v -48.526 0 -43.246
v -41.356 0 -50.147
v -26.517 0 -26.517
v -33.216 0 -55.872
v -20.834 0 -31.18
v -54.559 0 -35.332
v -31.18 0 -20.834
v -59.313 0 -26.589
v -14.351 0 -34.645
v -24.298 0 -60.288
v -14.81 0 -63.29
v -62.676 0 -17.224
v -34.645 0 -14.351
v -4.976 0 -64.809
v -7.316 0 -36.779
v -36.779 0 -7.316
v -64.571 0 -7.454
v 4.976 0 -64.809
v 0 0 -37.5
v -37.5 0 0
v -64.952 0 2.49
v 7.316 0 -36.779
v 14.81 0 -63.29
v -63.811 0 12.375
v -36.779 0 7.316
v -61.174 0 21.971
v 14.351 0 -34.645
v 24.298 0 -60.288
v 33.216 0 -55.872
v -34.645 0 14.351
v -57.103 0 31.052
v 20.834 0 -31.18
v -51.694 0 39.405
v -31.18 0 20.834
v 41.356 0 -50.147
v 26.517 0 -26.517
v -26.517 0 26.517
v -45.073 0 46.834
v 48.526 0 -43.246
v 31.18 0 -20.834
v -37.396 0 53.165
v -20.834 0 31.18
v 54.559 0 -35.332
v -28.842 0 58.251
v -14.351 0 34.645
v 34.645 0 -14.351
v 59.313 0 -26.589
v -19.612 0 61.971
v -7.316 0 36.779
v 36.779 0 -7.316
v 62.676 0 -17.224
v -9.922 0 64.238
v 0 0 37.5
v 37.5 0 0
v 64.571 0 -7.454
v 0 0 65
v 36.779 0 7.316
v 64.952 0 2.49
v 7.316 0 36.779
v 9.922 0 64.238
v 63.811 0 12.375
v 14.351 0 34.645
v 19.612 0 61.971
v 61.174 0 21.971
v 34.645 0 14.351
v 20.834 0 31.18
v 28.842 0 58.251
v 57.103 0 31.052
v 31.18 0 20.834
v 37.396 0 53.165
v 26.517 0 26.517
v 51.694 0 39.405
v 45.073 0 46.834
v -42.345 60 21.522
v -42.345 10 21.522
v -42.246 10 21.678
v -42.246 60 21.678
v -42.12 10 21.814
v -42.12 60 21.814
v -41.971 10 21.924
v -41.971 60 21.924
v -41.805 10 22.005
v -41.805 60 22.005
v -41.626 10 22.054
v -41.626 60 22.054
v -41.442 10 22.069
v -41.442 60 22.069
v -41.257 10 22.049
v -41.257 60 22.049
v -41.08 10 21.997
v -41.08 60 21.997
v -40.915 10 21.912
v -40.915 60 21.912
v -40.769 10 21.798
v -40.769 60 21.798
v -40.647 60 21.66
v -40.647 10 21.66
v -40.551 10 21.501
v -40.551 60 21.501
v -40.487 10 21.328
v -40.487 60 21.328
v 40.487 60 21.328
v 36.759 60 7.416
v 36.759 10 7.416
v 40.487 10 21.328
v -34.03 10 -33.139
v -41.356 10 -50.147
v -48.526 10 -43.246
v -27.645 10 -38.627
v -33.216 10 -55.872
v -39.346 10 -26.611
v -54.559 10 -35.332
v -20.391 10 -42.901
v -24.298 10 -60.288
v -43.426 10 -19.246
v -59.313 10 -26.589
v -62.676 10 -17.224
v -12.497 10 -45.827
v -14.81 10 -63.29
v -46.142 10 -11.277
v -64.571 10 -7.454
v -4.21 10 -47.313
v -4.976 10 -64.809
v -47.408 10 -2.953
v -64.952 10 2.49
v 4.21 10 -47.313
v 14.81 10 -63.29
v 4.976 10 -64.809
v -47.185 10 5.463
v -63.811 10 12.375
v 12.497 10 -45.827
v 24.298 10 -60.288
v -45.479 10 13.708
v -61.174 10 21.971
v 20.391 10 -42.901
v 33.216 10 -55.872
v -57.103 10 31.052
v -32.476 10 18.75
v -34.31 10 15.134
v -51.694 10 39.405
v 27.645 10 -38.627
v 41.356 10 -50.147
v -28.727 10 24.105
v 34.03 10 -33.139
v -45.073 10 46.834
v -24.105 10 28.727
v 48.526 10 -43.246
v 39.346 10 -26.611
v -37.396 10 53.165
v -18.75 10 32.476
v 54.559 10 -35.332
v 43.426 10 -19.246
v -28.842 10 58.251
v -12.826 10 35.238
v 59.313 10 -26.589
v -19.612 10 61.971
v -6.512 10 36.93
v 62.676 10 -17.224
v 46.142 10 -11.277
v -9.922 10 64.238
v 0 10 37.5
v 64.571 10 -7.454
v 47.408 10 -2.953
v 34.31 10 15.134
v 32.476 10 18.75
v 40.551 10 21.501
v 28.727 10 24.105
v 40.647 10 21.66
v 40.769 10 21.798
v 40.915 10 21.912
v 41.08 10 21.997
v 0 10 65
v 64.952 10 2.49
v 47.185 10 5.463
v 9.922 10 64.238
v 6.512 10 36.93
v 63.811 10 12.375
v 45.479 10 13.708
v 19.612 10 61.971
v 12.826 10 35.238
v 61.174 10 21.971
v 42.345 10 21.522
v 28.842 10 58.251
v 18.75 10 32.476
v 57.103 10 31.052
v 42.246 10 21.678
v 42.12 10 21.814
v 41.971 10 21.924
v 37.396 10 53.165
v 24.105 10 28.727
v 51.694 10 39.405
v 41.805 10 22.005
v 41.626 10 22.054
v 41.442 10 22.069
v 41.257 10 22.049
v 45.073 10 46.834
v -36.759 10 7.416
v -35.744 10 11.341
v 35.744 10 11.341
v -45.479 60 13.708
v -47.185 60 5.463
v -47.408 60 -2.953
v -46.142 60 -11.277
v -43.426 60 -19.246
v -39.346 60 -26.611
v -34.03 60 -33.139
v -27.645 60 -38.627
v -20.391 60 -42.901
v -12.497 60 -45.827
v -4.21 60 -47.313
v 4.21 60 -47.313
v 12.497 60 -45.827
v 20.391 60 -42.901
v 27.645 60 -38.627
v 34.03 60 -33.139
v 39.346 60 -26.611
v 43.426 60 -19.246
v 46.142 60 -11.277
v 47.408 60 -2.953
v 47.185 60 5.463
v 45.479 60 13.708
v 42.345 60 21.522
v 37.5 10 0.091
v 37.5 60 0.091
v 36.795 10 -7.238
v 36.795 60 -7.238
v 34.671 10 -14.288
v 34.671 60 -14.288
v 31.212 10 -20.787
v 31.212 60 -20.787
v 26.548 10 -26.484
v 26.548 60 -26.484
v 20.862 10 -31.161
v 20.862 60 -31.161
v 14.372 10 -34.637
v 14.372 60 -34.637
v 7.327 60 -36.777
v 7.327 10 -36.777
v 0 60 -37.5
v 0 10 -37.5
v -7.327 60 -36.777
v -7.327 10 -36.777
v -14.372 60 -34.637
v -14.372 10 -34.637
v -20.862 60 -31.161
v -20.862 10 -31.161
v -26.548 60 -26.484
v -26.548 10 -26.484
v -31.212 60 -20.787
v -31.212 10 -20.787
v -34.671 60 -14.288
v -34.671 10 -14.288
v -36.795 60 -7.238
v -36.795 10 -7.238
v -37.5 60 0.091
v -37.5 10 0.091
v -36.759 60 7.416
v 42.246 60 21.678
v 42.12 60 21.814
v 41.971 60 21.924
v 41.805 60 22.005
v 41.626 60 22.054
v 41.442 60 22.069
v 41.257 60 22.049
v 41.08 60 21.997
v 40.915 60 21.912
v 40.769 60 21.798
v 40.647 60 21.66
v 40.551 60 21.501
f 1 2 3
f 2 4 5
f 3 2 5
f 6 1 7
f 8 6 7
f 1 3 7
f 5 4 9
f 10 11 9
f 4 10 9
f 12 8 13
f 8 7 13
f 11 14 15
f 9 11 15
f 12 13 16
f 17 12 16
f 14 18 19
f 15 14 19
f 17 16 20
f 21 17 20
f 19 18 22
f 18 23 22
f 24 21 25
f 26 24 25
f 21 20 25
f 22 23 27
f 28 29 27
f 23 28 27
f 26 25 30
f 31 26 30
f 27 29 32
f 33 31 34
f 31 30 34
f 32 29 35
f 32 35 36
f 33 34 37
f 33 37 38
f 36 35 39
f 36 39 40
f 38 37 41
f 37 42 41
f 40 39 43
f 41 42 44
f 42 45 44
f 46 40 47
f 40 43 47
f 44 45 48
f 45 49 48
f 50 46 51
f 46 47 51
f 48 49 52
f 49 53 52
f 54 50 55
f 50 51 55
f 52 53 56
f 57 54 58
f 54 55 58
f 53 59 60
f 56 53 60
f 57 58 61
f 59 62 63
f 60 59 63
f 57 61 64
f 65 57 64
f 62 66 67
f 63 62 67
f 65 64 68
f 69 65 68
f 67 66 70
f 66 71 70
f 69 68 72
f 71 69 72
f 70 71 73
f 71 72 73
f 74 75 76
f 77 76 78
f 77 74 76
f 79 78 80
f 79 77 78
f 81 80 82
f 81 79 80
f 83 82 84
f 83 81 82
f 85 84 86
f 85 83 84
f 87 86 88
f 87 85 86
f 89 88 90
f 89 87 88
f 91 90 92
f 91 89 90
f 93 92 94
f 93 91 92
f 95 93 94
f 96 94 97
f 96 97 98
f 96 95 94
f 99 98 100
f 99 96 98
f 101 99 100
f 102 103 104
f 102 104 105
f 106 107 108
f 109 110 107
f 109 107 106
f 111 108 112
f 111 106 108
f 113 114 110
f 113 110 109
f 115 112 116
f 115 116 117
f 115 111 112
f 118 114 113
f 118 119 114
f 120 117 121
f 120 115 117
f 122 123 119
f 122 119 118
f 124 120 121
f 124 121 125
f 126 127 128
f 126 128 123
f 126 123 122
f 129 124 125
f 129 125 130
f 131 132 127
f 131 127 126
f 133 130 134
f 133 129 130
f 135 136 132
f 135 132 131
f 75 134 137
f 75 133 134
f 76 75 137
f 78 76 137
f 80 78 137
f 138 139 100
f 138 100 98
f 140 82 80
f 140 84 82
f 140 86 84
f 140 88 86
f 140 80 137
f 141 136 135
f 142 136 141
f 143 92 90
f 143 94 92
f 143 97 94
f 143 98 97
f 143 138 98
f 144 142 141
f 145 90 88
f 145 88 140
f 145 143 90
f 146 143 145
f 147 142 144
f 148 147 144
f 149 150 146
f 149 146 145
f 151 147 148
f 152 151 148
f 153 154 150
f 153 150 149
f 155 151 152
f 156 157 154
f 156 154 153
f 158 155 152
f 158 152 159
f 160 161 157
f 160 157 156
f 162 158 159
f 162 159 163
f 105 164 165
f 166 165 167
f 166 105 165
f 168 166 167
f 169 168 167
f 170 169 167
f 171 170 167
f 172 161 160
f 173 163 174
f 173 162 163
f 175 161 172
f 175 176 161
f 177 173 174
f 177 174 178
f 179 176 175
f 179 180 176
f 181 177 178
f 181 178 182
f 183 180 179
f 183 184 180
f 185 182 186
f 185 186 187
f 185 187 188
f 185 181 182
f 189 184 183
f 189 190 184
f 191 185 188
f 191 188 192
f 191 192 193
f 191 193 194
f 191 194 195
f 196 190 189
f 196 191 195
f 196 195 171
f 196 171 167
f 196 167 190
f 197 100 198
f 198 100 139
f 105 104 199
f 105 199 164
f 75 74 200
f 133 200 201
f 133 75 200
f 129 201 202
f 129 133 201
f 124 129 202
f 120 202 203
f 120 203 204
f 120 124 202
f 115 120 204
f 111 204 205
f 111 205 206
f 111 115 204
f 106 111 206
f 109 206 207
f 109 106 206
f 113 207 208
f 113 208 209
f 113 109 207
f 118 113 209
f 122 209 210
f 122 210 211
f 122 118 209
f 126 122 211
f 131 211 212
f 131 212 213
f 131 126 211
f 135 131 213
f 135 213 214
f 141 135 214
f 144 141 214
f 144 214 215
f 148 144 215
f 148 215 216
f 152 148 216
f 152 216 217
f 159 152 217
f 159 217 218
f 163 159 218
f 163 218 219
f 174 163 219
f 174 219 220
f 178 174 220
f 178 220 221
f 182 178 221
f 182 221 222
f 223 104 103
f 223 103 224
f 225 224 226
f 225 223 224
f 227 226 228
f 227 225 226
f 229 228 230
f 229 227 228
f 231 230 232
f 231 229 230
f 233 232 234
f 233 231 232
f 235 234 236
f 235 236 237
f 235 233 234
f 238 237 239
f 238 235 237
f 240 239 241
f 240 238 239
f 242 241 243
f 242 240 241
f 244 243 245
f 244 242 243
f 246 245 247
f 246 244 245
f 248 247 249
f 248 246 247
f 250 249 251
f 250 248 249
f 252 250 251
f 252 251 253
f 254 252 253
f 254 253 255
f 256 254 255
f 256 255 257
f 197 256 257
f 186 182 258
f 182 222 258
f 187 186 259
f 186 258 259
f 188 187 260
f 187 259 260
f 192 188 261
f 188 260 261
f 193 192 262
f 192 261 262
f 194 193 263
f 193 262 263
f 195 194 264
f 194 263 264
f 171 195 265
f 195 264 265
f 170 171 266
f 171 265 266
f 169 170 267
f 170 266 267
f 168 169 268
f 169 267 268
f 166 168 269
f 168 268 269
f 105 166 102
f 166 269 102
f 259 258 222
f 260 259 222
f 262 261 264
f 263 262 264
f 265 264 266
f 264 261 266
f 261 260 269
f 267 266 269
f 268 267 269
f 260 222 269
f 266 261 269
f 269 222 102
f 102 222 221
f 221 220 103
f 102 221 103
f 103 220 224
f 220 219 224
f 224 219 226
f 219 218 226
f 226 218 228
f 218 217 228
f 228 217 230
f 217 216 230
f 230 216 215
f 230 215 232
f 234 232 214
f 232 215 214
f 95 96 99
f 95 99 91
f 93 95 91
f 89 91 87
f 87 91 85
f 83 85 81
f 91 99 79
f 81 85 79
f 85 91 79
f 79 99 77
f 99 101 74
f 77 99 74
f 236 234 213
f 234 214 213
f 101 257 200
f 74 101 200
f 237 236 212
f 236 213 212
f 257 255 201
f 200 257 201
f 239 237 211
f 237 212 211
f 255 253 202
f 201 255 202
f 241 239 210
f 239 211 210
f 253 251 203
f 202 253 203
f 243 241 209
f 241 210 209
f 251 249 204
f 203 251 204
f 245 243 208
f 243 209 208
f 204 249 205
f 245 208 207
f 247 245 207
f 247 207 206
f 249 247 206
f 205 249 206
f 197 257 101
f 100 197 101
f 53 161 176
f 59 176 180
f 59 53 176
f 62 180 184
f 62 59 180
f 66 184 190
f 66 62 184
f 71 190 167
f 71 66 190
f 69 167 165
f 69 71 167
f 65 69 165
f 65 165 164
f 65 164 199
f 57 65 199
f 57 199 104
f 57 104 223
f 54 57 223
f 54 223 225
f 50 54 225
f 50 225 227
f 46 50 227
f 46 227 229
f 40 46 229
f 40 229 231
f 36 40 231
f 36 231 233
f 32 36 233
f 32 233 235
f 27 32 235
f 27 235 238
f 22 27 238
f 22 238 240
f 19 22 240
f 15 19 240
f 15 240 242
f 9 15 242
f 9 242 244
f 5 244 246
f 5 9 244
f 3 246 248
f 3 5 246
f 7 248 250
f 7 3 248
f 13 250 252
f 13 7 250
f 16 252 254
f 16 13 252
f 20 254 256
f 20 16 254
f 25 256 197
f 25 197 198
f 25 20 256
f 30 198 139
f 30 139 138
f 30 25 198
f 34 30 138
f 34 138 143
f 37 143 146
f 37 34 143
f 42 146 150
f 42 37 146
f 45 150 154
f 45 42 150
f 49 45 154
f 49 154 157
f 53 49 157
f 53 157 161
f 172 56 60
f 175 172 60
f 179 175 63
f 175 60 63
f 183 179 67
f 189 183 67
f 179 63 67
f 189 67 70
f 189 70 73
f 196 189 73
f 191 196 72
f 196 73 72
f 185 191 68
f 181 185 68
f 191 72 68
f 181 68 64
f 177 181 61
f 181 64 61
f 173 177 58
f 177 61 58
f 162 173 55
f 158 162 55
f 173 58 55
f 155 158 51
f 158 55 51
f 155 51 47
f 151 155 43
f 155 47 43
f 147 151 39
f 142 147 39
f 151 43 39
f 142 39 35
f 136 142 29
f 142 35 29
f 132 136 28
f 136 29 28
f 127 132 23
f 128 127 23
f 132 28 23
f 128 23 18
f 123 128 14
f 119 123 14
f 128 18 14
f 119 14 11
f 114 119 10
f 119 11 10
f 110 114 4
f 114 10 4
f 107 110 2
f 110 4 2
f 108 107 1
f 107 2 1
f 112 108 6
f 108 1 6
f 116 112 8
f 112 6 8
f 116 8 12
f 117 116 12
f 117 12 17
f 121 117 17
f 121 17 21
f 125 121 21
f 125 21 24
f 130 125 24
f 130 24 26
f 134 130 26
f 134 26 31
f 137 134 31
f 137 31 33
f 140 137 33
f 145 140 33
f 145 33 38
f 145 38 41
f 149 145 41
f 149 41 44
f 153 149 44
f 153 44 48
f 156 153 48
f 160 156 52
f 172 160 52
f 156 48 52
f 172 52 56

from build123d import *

# Parameters (mm, degrees)
SKETCH_2_R      = 65
SKETCH_2_R_2    = 37.5
EXTRUDE_1_DEPTH = 10
EXTRUDE_2_DEPTH = 50
CHAMFER_1_SIZE  = 10
FILLET_2_R      = 1


with BuildPart() as part:
    # 草圖2 → 填料-伸長1 (new body)
    with BuildSketch(Plane(origin=(0, 0, 0), x_dir=(1, 0, 0), z_dir=(0, 1, 0))):
        with Locations(Location((0, 0, 0), (0, 0, 270))):
            Circle(SKETCH_2_R)
        with Locations(Location((0, 0, 0), (0, 0, 270))):
            Circle(SKETCH_2_R_2, mode=Mode.SUBTRACT)
    extrude(amount=EXTRUDE_1_DEPTH)

    # 草圖3 → 填料-伸長2 (add)
    with BuildSketch(Plane(origin=(0, 10, 0), x_dir=(1, 0, 0), z_dir=(0, 1, 0))):
        with BuildLine():
            Line((-32.475952642, -18.75), (-41.13620668, -23.75))
            ThreePointArc((-41.13620668, -23.75), (0, 47.5), (41.13620668, -23.75))
            Line((41.13620668, -23.75), (32.475952642, -18.75))
            ThreePointArc((32.475952642, -18.75), (0, 37.5), (-32.475952642, -18.75))
        make_face()
    extrude(amount=EXTRUDE_2_DEPTH)

    # 導角1
    # the kernel refuses this chamfer: 10 mm, written as the material it takes off along each edge
    with BuildSketch(Plane(origin=(32.475952642, 10, 18.75), x_dir=(0.35352025121745984, 0, -0.935426871529327), z_dir=(0, 1, 0))) as chamfer_1_piece_1:
        with BuildLine():
            Line((12.116693809, 0), (-CHAMFER_1_SIZE * 0.161555917458, -CHAMFER_1_SIZE * 0.986863559736))
            Line((-CHAMFER_1_SIZE * 0.161555917458, -CHAMFER_1_SIZE * 0.986863559736), (0, 0))
            ThreePointArc((0, 0), (6.22343893, -0.492253103), (12.116693809, 0))
        make_face()
    extrude(amount=81.109263918, mode=Mode.SUBTRACT)
    with BuildSketch(Plane(origin=(-32.475952642, 10, 18.75), x_dir=(-0.3535202512174606, 0, -0.9354268715293267), z_dir=(0, 1, 0))) as chamfer_1_piece_2:
        with BuildLine():
            Line((12.116693809, 0), (-CHAMFER_1_SIZE * 0.161555917458, CHAMFER_1_SIZE * 0.986863559736))
            Line((-CHAMFER_1_SIZE * 0.161555917458, CHAMFER_1_SIZE * 0.986863559736), (0, 0))
            ThreePointArc((0, 0), (6.22343893, 0.492253103), (12.116693809, 0))
        make_face()
    extrude(amount=81.109263918, mode=Mode.SUBTRACT)

    # 圓角2
    fillet_2_edges = [part.edges().sort_by_distance(p)[0] for p in [
        (41.13620668, 35, 23.75),
        (-41.13620668, 35, 23.75),
    ]]
    fillet(fillet_2_edges, radius=FILLET_2_R)


solid = part.part
